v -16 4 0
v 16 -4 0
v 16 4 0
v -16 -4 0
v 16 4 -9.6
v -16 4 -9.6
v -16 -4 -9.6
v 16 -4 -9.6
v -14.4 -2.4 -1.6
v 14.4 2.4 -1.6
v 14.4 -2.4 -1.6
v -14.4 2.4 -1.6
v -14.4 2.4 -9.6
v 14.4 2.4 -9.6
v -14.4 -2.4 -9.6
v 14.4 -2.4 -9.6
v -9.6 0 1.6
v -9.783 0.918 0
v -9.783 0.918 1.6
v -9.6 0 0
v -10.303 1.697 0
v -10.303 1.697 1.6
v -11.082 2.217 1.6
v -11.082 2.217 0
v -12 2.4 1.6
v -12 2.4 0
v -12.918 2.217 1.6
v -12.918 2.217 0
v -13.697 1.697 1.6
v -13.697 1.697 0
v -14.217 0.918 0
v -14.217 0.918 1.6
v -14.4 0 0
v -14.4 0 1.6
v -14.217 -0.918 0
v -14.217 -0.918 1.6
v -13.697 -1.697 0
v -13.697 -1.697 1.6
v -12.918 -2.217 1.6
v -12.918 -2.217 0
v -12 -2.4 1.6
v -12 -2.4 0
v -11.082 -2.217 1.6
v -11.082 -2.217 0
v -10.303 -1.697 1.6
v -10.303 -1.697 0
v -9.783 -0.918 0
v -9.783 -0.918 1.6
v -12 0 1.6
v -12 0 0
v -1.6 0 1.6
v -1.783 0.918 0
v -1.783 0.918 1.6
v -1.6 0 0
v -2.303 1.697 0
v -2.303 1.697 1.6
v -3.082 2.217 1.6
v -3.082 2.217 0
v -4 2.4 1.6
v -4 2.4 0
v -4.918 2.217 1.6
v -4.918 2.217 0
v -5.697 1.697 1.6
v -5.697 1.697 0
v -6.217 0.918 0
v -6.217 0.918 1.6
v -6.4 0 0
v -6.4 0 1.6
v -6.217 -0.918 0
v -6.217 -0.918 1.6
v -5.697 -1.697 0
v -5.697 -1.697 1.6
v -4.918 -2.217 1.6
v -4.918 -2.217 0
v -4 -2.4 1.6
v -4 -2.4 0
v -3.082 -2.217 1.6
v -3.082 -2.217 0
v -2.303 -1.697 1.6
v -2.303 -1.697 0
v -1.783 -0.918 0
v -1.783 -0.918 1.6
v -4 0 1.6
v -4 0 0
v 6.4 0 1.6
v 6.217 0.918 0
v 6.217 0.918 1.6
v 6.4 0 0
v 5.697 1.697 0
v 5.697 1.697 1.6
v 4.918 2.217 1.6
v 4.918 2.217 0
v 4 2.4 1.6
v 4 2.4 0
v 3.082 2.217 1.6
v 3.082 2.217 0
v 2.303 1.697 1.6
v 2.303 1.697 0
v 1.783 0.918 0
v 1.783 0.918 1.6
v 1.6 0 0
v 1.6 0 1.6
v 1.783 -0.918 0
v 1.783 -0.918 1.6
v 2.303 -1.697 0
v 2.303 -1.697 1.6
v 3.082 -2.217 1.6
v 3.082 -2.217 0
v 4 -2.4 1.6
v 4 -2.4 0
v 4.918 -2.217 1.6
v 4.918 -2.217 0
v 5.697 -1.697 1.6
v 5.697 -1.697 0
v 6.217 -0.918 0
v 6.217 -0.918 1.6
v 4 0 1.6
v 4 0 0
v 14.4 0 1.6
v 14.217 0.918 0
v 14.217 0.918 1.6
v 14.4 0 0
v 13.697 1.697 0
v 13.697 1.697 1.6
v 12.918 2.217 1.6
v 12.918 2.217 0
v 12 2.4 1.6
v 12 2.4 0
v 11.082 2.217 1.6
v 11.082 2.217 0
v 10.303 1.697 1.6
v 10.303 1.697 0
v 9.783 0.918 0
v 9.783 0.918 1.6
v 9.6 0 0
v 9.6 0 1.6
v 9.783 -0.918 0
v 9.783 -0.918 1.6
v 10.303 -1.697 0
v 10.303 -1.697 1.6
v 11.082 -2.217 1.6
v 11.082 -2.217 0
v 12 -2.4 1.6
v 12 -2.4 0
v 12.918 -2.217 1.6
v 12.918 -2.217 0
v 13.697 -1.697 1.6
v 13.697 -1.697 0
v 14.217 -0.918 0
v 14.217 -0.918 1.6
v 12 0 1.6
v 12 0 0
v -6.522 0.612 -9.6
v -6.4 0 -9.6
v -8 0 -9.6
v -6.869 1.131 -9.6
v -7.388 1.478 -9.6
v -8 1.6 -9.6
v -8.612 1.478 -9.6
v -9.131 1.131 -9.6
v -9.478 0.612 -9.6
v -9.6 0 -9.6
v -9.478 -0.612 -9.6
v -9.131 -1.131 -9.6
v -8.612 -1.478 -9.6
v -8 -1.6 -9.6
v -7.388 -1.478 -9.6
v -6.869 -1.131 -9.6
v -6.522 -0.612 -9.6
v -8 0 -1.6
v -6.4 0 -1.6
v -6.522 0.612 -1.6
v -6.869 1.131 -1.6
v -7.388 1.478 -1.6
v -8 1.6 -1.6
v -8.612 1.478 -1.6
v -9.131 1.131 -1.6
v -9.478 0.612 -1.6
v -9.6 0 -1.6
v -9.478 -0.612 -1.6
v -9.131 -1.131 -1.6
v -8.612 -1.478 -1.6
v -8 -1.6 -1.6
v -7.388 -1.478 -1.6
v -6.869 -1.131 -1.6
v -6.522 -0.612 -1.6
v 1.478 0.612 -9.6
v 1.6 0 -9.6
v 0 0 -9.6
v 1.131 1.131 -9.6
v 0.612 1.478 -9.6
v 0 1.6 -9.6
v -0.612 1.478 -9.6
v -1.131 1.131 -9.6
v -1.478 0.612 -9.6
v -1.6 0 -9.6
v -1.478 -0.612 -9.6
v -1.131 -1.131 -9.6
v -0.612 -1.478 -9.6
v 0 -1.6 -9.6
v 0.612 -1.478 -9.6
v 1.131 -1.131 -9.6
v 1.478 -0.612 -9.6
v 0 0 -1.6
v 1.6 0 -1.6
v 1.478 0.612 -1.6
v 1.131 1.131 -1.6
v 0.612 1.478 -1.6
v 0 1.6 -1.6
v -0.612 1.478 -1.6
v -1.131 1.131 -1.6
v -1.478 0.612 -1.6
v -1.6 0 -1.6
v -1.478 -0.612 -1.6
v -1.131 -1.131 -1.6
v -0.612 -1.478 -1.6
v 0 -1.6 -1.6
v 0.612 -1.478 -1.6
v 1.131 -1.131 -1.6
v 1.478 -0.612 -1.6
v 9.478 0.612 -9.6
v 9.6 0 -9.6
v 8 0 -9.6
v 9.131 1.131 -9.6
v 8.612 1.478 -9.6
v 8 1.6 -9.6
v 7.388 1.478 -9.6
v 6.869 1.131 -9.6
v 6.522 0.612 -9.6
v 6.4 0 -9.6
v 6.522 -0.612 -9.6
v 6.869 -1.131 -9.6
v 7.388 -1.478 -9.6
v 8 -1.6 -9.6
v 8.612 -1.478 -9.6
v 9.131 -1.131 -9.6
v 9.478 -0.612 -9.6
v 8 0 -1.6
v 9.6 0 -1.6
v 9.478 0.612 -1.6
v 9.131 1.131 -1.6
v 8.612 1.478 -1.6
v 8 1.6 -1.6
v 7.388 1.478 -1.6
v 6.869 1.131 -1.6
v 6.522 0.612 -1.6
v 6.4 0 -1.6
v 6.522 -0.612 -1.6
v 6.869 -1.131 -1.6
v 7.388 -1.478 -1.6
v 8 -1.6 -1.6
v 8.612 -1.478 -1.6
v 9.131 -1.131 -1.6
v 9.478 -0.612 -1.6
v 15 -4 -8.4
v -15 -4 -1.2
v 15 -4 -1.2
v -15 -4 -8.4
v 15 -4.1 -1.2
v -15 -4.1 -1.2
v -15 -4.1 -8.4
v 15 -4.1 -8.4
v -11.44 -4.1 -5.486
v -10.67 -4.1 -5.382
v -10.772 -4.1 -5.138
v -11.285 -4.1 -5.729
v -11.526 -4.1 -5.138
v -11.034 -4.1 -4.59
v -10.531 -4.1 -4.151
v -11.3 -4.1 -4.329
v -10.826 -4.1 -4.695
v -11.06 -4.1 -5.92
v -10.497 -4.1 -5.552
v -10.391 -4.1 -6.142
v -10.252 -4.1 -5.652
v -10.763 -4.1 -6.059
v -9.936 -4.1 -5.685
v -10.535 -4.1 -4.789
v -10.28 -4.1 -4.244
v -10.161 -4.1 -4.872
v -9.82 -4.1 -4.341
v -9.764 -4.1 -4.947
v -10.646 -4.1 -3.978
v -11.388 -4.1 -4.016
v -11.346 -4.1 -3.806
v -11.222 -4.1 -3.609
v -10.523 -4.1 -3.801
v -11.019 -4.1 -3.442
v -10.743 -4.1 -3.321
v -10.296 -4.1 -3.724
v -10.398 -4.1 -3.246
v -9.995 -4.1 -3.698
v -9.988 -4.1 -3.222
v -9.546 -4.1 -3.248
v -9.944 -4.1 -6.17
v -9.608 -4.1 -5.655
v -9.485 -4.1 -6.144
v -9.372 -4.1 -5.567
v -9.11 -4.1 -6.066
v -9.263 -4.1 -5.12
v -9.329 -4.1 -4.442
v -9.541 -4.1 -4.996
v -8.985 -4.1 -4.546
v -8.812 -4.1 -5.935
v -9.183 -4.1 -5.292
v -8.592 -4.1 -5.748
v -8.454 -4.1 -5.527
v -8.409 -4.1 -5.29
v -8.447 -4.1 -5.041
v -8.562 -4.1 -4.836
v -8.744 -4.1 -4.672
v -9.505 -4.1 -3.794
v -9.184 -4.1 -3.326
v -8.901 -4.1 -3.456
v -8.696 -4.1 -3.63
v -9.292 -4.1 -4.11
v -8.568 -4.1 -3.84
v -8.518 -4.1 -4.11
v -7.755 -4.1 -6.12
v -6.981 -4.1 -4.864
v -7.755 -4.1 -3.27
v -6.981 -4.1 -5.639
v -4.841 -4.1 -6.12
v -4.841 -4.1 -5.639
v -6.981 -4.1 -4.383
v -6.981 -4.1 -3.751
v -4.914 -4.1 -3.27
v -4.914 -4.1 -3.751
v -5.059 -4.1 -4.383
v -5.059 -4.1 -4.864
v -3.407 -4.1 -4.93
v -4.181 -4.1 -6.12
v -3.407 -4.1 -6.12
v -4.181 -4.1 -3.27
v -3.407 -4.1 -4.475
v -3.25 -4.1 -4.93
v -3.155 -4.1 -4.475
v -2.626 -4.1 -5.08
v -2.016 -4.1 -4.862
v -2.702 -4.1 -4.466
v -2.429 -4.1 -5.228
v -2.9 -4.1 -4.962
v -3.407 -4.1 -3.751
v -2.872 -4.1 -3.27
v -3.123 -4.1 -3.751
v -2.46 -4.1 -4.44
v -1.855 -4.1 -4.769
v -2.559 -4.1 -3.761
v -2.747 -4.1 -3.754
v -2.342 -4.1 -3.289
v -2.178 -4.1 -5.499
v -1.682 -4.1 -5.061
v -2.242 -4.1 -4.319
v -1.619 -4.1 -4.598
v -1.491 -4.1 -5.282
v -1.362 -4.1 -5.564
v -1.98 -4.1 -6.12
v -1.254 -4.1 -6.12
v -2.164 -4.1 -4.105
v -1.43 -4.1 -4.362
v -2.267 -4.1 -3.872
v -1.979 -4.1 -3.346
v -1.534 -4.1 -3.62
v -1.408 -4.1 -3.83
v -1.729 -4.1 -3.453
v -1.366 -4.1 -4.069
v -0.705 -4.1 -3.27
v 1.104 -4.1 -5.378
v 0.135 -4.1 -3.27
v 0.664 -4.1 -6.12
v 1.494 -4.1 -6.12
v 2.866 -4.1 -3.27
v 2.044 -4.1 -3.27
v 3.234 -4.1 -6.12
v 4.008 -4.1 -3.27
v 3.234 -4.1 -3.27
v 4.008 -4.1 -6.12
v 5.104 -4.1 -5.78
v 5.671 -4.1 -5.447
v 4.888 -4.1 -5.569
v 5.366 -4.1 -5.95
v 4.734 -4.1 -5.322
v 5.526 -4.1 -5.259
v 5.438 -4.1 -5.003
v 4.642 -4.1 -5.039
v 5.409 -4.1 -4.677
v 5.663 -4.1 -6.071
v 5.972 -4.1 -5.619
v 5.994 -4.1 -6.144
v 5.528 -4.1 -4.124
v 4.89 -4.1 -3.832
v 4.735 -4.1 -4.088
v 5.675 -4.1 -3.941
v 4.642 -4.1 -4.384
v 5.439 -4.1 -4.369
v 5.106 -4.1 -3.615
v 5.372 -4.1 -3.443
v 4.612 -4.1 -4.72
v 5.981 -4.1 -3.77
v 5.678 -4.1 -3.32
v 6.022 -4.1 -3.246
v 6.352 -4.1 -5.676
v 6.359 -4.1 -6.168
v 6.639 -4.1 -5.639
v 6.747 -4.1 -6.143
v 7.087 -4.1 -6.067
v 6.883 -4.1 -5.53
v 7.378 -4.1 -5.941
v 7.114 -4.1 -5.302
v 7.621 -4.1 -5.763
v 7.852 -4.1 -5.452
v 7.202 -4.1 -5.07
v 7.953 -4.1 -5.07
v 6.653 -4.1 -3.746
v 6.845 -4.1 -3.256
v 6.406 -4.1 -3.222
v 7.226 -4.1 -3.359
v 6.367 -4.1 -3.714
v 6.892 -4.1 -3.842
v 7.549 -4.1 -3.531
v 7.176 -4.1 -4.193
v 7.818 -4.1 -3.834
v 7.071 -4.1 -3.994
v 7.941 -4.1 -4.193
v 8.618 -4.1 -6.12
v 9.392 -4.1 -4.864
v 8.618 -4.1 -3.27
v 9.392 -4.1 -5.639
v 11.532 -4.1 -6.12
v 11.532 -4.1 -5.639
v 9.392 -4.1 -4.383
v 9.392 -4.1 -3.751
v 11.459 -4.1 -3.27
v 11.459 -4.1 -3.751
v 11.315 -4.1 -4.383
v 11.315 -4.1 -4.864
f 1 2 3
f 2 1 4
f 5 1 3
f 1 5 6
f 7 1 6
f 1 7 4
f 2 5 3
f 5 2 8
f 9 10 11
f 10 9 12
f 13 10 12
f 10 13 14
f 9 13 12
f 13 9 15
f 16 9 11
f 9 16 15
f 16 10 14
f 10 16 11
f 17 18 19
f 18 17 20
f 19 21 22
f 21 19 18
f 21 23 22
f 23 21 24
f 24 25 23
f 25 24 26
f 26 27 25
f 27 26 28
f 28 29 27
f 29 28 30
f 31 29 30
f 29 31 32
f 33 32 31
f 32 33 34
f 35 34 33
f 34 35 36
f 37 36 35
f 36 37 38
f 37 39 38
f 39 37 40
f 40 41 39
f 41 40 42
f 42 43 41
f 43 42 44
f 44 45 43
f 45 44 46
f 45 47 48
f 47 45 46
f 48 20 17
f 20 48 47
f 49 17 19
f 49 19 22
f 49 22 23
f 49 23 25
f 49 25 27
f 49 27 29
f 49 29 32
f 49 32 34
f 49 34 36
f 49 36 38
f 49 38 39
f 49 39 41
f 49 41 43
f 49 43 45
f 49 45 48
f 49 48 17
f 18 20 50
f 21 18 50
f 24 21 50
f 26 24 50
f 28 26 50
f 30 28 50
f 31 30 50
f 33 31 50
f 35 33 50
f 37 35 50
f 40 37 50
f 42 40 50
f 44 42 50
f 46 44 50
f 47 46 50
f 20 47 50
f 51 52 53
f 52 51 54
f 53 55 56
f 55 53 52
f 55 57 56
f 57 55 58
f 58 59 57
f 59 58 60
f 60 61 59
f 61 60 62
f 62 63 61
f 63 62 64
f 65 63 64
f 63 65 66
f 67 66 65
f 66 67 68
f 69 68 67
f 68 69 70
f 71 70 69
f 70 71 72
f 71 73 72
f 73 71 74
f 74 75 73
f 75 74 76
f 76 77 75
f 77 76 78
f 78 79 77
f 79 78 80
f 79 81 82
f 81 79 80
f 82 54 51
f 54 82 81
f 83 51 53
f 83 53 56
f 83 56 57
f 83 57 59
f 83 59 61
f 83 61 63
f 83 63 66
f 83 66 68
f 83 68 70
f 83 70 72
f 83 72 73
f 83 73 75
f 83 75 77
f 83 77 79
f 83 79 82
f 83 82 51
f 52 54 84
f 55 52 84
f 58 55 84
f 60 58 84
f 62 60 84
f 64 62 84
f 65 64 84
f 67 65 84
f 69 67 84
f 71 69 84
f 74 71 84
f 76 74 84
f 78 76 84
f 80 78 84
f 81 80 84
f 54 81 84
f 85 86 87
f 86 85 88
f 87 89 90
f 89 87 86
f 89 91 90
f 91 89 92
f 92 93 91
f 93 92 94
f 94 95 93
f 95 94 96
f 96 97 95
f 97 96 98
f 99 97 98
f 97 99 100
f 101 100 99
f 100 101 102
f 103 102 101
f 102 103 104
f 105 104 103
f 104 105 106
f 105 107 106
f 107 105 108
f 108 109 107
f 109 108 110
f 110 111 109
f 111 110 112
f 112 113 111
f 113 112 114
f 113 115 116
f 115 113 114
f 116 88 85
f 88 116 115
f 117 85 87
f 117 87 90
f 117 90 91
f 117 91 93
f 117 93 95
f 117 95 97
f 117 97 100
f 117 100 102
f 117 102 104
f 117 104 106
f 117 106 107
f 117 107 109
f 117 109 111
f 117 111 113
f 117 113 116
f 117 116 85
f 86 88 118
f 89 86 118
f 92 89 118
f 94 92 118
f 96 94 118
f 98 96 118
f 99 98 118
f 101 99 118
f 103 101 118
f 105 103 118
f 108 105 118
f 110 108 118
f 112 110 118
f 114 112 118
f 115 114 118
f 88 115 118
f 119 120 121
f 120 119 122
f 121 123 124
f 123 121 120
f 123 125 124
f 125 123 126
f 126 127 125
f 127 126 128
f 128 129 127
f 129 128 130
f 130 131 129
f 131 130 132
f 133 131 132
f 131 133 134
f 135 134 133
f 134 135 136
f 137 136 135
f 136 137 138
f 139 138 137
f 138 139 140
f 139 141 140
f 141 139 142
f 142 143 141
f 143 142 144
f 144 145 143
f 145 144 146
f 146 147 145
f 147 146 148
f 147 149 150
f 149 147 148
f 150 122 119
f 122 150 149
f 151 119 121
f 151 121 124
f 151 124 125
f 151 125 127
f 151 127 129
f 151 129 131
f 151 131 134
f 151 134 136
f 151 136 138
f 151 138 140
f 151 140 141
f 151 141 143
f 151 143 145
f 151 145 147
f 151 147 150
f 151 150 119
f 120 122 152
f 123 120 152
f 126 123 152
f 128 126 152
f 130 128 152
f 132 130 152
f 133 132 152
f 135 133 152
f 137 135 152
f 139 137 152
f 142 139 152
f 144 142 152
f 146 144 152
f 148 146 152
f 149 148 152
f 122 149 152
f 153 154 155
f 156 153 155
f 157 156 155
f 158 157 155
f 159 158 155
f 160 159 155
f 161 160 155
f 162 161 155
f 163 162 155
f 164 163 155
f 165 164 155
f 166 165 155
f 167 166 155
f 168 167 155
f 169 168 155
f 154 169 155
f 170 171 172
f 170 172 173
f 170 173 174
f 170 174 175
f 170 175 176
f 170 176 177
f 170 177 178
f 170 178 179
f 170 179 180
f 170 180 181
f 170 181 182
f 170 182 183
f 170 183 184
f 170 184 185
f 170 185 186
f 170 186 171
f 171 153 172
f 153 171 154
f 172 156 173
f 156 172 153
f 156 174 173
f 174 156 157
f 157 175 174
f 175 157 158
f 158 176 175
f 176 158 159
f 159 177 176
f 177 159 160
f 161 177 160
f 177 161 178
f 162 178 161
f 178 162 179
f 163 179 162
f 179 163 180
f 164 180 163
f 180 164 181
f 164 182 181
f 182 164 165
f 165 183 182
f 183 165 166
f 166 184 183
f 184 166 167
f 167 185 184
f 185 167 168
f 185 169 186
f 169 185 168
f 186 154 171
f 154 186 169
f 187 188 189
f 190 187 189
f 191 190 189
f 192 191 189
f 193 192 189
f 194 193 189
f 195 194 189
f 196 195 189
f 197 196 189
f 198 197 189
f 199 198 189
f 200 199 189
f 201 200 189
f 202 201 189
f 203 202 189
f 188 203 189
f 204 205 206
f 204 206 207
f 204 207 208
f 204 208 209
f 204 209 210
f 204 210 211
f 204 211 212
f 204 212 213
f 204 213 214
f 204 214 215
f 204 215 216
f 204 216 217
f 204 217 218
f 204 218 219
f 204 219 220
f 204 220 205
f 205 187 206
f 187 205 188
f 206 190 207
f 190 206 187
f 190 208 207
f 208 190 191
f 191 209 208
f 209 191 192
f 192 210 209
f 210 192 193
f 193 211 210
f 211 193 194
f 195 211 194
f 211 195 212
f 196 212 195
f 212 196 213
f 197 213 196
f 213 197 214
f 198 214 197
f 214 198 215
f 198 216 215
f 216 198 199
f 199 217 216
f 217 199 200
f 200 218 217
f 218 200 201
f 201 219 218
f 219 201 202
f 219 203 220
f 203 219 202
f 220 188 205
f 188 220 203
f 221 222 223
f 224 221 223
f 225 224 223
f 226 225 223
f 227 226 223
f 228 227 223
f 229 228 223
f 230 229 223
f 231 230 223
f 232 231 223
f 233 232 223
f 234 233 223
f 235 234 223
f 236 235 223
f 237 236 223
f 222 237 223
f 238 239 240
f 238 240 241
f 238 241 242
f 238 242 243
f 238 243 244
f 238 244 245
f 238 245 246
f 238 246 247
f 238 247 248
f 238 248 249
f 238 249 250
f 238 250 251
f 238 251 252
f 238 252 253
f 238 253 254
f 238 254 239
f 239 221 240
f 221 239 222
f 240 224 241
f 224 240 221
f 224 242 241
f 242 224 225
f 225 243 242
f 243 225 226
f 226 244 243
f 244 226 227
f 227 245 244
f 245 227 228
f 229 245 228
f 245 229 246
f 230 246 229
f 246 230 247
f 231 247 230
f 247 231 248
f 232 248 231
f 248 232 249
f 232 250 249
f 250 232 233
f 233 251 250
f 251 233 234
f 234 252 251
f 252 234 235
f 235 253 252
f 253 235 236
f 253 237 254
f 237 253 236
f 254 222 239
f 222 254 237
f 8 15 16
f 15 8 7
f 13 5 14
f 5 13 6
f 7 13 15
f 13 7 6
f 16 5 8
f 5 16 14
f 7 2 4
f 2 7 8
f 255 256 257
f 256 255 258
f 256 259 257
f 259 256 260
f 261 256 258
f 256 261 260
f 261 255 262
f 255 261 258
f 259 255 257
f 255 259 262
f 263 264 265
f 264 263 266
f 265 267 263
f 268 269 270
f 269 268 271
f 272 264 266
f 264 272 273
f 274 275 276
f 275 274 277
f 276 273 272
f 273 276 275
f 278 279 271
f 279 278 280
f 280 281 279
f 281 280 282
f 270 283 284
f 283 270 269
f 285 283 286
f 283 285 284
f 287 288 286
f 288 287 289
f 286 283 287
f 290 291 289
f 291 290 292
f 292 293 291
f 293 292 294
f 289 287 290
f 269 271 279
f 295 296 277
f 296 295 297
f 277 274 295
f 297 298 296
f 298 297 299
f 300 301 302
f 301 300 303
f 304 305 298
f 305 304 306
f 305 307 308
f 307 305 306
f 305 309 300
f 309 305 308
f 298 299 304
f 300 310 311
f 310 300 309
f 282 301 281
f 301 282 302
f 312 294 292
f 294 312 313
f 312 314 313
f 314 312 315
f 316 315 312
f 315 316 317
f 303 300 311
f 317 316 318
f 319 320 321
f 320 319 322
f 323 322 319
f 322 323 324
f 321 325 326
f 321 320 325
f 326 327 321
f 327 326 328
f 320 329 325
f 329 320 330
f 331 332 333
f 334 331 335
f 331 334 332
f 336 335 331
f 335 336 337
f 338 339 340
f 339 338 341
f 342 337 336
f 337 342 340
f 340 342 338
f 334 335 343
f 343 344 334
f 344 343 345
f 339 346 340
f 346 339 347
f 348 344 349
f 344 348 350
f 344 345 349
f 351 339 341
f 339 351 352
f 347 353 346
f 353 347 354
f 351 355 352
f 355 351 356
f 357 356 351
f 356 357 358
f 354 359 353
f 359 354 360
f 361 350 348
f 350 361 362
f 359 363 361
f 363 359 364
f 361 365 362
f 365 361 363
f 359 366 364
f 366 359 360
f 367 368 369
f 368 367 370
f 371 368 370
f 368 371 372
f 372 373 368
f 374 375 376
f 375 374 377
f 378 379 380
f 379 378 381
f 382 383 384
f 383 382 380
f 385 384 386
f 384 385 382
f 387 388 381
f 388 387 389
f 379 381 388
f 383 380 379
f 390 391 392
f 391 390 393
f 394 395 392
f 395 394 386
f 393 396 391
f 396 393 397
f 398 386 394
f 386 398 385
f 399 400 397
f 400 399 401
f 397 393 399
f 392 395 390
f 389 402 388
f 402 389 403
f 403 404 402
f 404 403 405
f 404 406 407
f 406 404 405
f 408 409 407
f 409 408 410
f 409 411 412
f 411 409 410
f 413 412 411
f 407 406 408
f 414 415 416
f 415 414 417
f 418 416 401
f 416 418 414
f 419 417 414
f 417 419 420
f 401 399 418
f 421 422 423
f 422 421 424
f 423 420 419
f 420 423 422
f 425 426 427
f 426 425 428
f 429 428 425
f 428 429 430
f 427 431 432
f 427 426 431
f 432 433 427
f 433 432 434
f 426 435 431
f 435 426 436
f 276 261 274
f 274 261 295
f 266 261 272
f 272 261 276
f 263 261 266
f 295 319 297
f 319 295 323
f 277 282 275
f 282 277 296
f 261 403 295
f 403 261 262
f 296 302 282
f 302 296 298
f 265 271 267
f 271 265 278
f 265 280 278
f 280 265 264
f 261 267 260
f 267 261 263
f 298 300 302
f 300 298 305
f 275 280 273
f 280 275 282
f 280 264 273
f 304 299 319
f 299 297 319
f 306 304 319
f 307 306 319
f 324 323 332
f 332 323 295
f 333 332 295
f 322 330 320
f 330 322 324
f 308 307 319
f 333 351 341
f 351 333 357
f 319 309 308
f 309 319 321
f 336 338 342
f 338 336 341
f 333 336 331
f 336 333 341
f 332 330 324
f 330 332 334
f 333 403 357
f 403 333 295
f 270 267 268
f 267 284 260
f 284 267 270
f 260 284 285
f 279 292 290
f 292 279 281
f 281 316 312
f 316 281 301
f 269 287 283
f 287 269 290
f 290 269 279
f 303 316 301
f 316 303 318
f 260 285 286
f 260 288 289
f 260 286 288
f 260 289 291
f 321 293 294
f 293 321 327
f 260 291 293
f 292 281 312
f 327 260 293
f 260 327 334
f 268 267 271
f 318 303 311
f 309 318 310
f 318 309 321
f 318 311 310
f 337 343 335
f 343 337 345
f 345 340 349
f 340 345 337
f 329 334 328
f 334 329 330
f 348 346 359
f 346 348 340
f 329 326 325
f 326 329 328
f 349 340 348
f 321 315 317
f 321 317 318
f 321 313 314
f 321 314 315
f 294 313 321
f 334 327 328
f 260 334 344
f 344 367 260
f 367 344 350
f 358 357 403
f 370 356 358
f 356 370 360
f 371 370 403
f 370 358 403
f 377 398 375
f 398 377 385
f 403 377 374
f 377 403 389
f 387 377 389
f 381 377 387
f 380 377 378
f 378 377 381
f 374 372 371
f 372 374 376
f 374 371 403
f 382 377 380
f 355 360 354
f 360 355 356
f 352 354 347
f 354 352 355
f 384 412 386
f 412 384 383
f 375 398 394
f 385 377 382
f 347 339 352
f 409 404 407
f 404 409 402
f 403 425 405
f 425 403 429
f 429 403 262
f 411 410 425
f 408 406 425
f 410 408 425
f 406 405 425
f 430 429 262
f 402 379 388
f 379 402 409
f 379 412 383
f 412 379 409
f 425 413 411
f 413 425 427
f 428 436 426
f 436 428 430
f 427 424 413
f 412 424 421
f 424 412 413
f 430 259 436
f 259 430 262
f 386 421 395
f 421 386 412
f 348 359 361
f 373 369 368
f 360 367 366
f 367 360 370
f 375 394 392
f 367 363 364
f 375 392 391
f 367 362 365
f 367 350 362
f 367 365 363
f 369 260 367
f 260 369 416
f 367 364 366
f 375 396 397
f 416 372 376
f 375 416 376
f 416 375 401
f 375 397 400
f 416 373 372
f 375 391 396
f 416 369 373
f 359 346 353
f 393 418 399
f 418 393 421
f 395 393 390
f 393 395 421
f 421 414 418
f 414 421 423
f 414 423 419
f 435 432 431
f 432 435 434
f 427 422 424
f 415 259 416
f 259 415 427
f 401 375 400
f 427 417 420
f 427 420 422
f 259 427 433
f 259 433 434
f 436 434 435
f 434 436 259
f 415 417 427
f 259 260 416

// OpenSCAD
use <../lib.scad>
use <190435b.scad>
use <3010.scad>
function ldraw_lib__3010d08() = [
// 0 Brick  1 x  4 with White "SERVICE" Sticker
// 0 Name: 3010d08.dat
// 0 Author: Takeshi Takahashi [RainbowDolphin]
// 0 !LDRAW_ORG Shortcut UPDATE 2024-05
// 0 !LICENSE Licensed under CC BY 4.0 : see CAreadme.txt
// 
// 0 BFC CERTIFY CCW
  [0,"BFC","CERTIFY"],
  [0,"BFC","CCW"],
// 
// 0 !CATEGORY Sticker Shortcut
// 0 !KEYWORDS Auto service truck, Bricklink 3010pb063, Set 646-1
// 
// 0 !HISTORY 2024-06-30 [OrionP] Official Update 2024-05
// 
// 1 16 0 0 0 1 0 0 0 1 0 0 0 1 3010.dat
  [1,16,0,0,0,1,0,0,0,1,0,0,0,1, ldraw_lib__3010()],
// 1 16 0 12 -10 1 0 0 0 0 -1 0 1 0 190435b.dat
  [1,16,0,12,-10,1,0,0,0,0,-1,0,1,0, ldraw_lib__190435b()],
];
module ldraw_lib__3010d08(step=0, col=false, unit=2/5, alt=false, line=0.2, solid=!$preview)
    makepoly(ldraw_lib__3010d08(), step=step, col=col, unit=unit, alt=alt, line=line, solid=solid);
ldraw_lib__3010d08(line=0.2);
